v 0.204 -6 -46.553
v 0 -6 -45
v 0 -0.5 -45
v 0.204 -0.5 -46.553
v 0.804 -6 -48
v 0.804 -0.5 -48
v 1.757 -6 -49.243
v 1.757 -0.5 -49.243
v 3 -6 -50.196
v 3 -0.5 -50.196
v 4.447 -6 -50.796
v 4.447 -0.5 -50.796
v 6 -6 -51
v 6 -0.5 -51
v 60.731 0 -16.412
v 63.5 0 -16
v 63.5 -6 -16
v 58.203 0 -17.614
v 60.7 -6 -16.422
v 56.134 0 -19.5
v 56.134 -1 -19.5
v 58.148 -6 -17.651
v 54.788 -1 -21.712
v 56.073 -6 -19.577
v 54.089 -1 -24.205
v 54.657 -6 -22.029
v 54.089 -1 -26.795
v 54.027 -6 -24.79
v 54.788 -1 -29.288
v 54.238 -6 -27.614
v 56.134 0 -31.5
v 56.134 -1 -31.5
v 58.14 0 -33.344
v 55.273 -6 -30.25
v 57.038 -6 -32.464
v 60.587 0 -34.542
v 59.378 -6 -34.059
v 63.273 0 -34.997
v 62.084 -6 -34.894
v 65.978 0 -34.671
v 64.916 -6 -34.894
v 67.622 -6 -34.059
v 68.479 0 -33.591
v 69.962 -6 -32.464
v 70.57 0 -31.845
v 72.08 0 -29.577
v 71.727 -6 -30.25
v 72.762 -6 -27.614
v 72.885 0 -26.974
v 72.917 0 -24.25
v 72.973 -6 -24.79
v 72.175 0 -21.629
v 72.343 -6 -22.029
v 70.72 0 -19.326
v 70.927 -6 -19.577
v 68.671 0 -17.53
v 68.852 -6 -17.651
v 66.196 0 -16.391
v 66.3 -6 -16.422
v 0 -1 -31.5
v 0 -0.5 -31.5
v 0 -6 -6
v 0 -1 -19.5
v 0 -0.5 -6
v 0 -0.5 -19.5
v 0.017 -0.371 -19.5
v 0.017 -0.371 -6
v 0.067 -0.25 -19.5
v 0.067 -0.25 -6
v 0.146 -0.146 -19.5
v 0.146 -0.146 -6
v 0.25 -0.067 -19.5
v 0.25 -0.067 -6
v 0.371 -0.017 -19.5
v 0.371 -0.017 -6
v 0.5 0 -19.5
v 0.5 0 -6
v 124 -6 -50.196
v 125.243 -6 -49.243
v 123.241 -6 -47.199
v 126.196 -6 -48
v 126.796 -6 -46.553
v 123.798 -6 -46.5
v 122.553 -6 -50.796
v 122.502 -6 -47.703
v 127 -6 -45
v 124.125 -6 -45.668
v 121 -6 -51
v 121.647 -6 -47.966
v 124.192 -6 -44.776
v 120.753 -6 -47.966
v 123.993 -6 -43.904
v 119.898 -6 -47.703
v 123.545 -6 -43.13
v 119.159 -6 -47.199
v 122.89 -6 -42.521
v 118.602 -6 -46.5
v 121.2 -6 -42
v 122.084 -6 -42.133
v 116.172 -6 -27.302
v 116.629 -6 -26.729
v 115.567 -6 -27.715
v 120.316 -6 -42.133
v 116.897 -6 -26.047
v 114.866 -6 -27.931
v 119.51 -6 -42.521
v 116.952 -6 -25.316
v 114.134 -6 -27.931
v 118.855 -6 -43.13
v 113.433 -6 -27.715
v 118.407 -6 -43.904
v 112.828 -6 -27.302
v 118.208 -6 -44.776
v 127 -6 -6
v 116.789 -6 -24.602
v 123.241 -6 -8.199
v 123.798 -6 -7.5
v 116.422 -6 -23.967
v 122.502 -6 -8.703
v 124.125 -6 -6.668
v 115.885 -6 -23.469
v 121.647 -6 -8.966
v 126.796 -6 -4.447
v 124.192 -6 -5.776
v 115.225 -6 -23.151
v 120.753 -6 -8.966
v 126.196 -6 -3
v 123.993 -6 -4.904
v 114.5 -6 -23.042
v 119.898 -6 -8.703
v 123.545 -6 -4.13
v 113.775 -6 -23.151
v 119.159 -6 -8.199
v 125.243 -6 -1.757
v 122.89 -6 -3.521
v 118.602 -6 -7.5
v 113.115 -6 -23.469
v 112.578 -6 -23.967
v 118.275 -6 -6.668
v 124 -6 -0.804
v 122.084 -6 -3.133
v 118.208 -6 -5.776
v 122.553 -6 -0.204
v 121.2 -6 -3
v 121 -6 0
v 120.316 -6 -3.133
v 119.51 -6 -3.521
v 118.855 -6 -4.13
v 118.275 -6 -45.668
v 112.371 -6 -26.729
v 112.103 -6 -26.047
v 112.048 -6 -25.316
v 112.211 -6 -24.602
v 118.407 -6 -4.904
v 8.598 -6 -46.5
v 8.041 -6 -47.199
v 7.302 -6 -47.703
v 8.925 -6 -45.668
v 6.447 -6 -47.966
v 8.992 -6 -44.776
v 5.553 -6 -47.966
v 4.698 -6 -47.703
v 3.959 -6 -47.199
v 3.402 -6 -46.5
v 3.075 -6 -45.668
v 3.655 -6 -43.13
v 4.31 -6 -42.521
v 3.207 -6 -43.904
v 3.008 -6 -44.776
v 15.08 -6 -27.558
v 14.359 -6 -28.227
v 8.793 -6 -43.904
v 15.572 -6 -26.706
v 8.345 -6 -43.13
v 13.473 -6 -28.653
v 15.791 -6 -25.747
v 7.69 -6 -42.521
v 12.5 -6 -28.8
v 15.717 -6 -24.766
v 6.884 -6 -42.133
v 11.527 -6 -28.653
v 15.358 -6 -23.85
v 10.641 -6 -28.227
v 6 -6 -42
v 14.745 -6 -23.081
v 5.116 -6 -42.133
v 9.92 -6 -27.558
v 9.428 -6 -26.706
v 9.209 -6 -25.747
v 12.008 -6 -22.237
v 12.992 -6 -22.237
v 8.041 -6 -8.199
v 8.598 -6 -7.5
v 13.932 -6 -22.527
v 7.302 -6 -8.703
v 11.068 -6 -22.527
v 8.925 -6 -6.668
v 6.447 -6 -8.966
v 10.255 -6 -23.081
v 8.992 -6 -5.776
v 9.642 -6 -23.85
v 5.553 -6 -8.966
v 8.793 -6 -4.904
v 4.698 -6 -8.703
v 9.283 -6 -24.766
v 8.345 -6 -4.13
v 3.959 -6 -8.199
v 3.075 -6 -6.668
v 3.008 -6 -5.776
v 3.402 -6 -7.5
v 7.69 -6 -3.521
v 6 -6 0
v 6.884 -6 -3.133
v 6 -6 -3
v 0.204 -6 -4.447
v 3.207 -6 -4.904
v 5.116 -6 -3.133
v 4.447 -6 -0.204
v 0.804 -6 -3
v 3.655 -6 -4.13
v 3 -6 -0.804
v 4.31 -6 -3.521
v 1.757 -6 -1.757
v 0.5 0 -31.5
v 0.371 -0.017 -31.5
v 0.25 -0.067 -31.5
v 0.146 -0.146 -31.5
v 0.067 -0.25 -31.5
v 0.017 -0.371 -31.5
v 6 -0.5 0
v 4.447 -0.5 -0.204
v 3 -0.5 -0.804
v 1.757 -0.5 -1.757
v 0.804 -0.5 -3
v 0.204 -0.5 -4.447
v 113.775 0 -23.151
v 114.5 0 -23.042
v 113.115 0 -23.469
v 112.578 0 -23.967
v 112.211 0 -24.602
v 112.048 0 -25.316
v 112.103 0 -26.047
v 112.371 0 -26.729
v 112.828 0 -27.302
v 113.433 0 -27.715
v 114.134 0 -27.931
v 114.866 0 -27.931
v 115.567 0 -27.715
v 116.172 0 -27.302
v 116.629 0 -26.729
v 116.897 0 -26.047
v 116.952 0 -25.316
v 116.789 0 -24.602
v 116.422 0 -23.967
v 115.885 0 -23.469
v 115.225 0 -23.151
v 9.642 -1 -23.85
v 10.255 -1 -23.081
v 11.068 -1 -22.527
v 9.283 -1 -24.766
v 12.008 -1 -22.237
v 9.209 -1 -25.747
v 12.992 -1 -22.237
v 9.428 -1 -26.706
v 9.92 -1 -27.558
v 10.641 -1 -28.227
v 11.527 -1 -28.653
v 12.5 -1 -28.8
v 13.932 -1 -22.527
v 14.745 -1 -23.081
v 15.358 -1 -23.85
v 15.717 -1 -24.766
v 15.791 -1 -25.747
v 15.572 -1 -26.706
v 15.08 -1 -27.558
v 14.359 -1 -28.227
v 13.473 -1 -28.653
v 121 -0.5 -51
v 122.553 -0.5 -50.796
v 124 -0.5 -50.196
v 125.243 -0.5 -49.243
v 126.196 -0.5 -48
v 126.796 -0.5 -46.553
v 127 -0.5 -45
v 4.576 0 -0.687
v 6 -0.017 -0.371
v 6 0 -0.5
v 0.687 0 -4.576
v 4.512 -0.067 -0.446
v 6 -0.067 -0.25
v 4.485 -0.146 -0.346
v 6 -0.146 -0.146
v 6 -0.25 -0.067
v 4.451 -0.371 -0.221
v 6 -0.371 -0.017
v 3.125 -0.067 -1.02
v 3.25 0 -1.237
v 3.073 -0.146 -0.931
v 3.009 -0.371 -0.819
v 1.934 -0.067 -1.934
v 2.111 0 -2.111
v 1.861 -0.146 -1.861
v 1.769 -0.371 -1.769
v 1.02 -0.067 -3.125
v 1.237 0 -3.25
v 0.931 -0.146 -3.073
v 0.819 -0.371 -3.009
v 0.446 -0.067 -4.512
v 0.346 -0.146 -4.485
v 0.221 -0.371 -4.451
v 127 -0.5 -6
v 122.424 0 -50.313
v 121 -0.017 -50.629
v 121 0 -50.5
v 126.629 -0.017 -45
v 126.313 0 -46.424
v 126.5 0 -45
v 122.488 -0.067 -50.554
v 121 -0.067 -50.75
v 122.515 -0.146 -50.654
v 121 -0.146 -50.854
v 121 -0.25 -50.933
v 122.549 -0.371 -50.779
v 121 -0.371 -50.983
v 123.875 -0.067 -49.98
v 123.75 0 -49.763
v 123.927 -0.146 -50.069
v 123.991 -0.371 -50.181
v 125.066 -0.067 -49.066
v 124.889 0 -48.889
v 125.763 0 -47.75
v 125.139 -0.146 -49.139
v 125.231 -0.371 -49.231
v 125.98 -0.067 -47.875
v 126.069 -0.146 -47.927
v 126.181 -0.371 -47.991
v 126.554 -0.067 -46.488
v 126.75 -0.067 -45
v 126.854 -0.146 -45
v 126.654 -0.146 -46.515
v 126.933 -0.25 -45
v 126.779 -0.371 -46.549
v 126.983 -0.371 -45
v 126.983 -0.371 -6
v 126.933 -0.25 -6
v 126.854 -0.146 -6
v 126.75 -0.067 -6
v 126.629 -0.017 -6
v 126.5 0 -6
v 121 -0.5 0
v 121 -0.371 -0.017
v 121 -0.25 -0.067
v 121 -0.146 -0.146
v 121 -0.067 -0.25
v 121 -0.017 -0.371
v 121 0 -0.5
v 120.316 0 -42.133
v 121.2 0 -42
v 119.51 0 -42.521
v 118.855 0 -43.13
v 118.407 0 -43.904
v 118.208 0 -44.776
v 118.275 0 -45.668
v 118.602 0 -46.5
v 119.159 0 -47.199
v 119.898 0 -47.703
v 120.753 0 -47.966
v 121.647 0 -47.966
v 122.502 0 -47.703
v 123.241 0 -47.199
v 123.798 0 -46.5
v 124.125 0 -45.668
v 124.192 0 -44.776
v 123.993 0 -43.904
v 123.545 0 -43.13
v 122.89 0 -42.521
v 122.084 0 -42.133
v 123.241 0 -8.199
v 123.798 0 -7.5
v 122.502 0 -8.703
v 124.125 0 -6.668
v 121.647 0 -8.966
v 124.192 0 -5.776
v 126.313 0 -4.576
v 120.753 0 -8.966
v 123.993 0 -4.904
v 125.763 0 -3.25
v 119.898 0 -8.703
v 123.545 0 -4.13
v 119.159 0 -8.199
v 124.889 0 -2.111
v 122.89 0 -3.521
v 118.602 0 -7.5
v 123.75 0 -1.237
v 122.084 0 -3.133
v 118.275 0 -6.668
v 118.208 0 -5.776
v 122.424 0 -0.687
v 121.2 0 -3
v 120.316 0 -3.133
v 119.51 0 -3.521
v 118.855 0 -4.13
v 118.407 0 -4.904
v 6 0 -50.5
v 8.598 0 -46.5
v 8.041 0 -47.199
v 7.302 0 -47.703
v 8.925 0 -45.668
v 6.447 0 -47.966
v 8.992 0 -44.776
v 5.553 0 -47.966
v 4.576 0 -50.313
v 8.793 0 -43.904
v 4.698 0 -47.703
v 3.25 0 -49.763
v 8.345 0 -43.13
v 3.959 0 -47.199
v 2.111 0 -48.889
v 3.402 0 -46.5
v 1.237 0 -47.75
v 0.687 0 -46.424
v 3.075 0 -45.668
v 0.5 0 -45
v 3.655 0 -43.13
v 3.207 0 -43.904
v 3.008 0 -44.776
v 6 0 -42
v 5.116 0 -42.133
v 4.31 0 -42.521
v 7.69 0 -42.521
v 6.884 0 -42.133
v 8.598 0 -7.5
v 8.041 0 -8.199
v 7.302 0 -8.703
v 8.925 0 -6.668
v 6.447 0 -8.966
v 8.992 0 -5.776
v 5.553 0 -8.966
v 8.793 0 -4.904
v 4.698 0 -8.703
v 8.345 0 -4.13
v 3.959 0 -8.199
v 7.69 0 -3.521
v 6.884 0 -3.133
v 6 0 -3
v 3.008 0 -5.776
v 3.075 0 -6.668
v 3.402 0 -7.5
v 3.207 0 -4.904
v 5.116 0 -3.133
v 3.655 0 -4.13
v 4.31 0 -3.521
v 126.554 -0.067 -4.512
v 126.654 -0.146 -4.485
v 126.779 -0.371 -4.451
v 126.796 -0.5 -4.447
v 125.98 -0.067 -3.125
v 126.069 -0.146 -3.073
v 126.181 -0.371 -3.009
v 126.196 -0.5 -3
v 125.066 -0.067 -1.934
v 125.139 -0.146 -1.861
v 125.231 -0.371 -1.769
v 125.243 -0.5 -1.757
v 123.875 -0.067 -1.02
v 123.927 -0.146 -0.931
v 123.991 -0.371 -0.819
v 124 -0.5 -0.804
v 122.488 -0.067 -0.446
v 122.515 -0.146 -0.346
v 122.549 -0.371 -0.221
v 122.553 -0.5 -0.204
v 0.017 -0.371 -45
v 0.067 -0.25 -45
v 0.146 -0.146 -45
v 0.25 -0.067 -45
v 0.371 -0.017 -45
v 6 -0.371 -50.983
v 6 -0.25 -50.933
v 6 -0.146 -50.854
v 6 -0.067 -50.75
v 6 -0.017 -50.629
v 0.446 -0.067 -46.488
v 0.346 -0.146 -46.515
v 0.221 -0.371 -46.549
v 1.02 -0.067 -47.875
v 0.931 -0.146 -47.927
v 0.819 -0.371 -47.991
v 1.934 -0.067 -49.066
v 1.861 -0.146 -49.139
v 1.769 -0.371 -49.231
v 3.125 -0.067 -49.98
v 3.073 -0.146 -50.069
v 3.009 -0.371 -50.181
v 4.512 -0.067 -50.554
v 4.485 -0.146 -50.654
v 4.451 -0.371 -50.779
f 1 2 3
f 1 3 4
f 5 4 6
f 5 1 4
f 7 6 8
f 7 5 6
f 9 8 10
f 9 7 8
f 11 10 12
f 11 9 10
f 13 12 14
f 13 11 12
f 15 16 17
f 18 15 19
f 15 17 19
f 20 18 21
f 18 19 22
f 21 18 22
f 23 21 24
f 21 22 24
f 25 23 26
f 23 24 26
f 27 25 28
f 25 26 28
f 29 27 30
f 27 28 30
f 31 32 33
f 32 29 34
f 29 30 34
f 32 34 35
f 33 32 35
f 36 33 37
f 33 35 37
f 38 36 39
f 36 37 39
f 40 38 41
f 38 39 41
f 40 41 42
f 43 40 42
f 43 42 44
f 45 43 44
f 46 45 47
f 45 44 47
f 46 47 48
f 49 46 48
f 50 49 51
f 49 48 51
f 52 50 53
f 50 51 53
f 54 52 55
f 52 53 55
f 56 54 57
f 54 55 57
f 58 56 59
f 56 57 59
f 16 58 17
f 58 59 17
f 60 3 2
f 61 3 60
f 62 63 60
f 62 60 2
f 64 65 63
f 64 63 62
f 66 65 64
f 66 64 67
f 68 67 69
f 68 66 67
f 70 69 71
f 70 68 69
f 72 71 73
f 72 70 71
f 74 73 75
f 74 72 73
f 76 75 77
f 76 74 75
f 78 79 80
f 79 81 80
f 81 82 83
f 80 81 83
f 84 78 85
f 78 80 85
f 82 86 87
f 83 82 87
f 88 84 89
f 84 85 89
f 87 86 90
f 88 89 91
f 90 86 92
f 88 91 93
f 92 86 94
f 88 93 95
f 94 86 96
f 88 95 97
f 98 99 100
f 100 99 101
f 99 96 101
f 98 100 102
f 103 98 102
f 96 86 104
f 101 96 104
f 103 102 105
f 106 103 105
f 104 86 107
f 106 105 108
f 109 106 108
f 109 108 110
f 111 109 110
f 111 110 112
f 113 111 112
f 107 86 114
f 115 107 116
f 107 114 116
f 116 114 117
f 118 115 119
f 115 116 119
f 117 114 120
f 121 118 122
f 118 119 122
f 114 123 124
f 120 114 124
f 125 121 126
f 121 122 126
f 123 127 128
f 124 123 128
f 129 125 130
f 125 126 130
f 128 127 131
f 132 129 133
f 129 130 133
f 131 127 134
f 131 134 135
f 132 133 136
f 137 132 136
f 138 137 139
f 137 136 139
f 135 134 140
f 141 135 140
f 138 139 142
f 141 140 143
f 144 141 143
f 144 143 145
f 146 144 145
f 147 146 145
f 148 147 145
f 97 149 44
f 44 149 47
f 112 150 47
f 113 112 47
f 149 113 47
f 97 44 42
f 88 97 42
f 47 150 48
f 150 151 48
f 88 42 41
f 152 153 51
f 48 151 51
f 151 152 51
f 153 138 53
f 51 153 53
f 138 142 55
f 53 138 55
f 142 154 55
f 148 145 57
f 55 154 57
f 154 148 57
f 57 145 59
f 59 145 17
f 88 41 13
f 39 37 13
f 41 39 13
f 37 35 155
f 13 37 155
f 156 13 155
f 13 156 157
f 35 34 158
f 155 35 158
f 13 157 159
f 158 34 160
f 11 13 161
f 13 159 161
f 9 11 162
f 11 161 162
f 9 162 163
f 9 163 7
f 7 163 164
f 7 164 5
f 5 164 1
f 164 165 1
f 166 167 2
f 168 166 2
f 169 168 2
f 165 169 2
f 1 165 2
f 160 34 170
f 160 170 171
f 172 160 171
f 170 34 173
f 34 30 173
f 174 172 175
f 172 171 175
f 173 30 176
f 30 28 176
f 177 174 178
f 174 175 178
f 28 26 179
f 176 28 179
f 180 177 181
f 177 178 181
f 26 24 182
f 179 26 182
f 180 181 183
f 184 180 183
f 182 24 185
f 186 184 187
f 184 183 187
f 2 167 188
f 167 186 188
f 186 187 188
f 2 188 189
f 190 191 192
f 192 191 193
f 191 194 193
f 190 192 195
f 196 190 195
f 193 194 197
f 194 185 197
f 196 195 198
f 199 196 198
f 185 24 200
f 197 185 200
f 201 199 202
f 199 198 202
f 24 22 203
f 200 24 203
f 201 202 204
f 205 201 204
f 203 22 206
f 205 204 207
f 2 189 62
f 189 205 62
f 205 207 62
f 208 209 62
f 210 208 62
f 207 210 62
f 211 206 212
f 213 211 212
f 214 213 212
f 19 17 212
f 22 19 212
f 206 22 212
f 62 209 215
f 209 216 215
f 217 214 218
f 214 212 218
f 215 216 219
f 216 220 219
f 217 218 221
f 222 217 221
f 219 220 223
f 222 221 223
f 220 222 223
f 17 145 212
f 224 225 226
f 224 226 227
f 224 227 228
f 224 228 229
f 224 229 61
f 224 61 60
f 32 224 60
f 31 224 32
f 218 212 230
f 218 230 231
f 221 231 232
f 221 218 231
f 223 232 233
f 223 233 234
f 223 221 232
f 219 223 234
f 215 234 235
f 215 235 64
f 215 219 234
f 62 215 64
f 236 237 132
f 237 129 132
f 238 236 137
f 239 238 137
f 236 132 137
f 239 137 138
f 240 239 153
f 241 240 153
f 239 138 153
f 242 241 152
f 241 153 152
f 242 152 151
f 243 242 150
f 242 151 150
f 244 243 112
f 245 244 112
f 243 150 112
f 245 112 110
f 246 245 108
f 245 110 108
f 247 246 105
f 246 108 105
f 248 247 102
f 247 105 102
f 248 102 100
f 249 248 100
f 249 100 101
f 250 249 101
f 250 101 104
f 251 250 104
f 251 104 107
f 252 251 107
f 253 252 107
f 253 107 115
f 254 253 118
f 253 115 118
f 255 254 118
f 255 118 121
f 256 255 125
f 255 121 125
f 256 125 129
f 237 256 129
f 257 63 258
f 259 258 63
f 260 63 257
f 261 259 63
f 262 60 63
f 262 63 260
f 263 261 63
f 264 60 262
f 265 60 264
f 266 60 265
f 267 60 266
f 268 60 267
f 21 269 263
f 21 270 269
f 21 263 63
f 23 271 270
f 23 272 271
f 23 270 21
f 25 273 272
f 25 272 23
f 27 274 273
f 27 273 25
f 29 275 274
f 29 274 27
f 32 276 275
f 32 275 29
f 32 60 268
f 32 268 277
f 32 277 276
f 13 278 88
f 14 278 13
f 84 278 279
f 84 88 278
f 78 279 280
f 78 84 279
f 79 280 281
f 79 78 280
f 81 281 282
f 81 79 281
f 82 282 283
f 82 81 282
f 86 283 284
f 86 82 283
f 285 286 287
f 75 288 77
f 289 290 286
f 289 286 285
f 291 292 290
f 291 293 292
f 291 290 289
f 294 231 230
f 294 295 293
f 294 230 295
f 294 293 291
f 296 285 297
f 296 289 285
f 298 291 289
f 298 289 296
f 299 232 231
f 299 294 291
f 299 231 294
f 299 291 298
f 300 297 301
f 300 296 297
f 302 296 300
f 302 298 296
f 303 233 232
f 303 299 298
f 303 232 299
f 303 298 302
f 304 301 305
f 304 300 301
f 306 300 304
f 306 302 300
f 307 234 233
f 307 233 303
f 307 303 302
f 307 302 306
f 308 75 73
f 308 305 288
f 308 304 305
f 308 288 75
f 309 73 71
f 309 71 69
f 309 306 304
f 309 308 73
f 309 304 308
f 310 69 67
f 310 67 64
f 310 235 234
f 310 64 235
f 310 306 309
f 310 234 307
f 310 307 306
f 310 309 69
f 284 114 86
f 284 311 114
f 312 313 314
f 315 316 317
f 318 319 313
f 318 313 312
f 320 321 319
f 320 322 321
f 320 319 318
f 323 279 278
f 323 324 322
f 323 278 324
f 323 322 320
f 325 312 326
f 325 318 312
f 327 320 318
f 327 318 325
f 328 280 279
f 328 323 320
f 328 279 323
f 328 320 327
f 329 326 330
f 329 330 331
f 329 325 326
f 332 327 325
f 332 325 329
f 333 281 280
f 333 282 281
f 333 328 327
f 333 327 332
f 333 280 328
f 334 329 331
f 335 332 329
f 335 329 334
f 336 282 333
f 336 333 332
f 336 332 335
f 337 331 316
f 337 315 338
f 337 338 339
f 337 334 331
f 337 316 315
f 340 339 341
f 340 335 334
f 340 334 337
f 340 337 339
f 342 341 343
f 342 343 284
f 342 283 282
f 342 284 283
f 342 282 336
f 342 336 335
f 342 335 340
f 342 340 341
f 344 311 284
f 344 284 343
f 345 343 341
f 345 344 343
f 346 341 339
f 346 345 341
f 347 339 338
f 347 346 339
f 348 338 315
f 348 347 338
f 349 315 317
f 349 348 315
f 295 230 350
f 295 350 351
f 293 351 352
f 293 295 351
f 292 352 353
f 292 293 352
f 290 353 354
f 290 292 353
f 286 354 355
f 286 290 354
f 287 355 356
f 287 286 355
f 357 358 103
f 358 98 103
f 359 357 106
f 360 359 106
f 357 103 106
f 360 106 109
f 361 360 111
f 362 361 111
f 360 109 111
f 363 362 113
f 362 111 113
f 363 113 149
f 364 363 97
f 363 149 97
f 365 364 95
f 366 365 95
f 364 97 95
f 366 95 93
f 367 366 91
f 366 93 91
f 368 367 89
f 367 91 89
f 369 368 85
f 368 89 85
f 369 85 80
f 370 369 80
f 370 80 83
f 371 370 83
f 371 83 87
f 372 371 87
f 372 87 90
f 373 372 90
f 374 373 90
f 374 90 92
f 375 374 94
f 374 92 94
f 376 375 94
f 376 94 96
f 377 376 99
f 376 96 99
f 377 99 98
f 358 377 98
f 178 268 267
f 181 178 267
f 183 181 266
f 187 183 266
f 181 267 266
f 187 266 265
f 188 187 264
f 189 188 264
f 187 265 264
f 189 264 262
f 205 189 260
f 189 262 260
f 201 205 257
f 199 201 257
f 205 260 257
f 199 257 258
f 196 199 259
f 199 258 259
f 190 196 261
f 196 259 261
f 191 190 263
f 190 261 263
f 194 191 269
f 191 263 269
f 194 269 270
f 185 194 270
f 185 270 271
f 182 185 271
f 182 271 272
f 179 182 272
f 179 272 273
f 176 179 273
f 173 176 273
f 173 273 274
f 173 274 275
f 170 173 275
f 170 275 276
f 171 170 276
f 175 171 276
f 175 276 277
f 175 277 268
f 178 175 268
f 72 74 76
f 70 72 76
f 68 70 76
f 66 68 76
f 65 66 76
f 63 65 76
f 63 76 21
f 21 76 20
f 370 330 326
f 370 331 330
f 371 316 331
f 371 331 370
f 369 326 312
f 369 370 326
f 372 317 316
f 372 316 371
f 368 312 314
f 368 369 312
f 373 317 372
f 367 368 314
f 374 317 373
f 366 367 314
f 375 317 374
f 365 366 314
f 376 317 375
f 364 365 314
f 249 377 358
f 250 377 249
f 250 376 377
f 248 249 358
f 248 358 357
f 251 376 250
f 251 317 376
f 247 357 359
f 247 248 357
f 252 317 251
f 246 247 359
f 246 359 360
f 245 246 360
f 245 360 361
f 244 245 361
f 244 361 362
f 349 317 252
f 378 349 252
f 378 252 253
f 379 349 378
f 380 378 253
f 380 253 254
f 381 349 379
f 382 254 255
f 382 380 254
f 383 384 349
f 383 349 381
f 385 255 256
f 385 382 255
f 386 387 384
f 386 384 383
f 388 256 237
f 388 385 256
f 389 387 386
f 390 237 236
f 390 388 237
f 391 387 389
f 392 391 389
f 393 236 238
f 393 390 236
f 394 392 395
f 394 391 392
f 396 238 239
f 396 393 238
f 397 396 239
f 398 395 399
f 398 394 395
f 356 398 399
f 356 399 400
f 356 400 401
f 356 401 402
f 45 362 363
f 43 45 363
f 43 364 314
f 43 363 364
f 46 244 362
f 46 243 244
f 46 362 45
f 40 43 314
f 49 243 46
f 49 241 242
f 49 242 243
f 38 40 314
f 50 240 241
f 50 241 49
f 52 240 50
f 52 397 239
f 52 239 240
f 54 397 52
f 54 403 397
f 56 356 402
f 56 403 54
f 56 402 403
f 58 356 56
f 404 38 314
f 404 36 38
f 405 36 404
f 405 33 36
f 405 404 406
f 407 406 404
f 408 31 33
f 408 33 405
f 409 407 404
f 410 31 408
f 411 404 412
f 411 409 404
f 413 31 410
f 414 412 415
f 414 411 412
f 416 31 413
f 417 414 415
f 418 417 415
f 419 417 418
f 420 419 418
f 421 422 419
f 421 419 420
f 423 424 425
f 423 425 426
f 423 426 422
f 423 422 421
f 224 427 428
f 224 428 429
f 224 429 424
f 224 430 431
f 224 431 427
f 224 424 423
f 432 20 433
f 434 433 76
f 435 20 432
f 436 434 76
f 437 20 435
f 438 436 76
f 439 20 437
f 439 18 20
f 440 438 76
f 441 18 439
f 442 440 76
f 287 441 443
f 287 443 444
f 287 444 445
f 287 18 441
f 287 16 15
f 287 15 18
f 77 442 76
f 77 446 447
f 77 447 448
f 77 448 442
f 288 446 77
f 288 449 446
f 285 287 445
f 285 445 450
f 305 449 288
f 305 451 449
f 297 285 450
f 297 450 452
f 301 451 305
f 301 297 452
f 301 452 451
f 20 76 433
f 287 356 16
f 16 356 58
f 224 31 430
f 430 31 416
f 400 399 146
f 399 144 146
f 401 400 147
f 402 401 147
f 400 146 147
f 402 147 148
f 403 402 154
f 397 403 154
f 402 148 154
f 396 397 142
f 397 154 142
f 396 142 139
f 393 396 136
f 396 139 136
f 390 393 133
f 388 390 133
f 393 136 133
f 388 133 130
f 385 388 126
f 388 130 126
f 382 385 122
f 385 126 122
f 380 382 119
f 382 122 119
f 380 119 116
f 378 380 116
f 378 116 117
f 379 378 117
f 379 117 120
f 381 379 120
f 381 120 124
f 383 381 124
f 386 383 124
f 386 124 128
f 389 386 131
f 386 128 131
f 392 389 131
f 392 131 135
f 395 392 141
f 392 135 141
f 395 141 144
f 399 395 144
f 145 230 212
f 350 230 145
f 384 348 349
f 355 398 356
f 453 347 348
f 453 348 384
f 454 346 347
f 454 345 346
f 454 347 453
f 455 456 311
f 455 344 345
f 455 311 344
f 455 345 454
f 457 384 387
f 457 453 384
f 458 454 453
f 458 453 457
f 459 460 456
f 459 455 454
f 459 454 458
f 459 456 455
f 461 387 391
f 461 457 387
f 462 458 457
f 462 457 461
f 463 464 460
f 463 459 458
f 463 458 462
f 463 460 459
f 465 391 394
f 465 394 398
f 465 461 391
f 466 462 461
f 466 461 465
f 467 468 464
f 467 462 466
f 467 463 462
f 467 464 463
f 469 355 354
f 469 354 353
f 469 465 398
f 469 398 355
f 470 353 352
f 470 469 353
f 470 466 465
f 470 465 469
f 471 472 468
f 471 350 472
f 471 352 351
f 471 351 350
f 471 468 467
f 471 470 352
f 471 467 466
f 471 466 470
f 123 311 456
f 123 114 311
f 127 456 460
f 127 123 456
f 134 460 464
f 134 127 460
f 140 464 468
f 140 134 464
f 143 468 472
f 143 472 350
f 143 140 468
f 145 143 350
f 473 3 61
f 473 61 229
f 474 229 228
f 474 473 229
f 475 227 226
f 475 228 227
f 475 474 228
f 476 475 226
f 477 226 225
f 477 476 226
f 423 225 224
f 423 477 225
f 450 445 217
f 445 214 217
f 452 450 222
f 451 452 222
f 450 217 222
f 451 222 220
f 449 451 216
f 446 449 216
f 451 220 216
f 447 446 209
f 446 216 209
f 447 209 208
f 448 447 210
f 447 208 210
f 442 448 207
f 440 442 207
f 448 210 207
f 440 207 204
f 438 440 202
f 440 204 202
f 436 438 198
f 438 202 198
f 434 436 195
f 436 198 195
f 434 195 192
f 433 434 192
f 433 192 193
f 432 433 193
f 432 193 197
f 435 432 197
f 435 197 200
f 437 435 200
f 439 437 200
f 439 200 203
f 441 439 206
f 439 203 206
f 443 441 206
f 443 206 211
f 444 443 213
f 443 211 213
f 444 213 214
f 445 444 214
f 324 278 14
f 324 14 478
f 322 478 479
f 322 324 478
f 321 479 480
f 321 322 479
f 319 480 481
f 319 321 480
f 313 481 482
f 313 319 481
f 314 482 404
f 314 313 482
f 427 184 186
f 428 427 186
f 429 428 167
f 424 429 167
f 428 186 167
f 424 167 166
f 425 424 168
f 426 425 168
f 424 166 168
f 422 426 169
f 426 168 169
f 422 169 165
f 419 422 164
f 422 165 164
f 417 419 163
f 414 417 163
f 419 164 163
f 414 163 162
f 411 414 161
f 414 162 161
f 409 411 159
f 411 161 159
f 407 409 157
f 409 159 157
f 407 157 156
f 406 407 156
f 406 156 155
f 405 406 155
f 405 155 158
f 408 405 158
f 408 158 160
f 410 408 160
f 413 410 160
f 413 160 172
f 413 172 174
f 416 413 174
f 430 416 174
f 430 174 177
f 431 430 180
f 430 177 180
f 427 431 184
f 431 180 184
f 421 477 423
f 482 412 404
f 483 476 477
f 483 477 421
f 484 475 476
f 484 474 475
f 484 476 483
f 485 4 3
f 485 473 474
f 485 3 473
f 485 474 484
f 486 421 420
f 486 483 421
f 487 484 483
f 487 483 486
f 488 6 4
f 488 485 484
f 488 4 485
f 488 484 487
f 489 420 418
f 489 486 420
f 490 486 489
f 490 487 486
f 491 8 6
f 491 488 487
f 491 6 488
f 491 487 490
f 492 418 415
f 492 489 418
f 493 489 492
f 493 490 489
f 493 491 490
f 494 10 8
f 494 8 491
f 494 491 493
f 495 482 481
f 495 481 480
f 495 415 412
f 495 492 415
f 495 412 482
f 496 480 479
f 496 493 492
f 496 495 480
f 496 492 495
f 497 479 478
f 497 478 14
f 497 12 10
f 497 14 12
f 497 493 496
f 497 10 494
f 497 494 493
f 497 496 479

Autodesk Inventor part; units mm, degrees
ref_plane "YZ Plane" through (0, 0, 0) normal (1, 0, 0) x (0, 1, 0)
ref_plane "XZ Plane" through (0, 0, 0) normal (0, 1, 0) x (-1, 0, 0)
ref_plane "XY Plane" through (0, 0, 0) normal (0, 0, 1) x (1, 0, 0)
sketch "Esboço1" plane through (0, 0, 0) normal (0, 1, 0) x (-1, 0, 0)
  line L0 (0, 0) -> (-127, 0)
  line L1 (-127, 0) -> (-127, -51)
  line L2 (-127, -51) -> (0, -51)
  line L3 (0, -51) -> (0, 0)
  dimension "d0" = 127
  dimension "d1" = 51
extrude "Extrusão1" add sketch "Esboço1" against normal blind 6
sketch "Esboço2" plane through (0, 0, 0) normal (0, 1, 0) x (1, 0, 0)
  line L0 (127, 51) -> (127, 0) projected
  line L1 (63.5, 0) -> (6, 0)
  line L2 (0, 51) -> (127, 51) projected
  line L3 (0, 6) -> (6, 6)
  point P0 (6, 45)
  point P1 (121.2, 45)
  point P2 (121.2, 6)
  dimension "d4" = 57.5
hole "Furo1" at (6, 0, -6) at (6, 0, -45) at (121.2, 0, -45) at (121.2, 0, -6) direction (0, -1, 0) diameter 6 end through all
sketch "Esboço3" plane through (0, 0, 0) normal (0, 1, 0) x (1, 0, 0)
  line L0 (127, 0) -> (0, 0) projected
  line L1 (0, 0) -> (57.5, 0)
  line L2 (0, 51) -> (127, 51) projected
  line L3 (0, 0) -> (0, 51) projected
  line L4 (0, 25.5) -> (127, 25.5)
  line L5 (127, 51) -> (127, 0) projected
  line L6 (0, 25.5) -> (63.5, 25.5)
  circle A0 centre (63.5, 25.5) radius 9.5
  point P0 (57.5, 25.5)
  dimension "d17" = 57.5
  dimension "d47" = 63.5
  dimension "d48" = 19
hole "Furo2" at (63.5, 0, -25.5) direction (0, -1, 0) diameter 19 end through all
sketch "Esboço4" plane through (0, 0, 0) normal (0, 1, 0) x (1, 0, 0)
  line L0 (0, 0) -> (0, 51) projected
  line L1 (0, 31.5) -> (56.1345, 31.5)
  line L2 (0, 19.5) -> (56.1345, 19.5)
  circle A0 centre (63.5, 25.5) radius 9.5 projected
  circle A1 centre (63.5, 25.5) radius 9.5
extrude "Extrusão2" cut sketch "Esboço4" against normal blind 1 contours L0 L1 A0 L2
sketch "Esboço5" plane through (0, -1, 0) normal (0, 1, 0) x (1, 0, 0)
  circle A0 centre (63.5, 25.5) radius 9.5 projected
  circle A1 centre (63.5, 25.5) radius 9.5
  line L0 (63.5, 25.5) -> (12.5, 25.5)
  point P0 (0, 0)
  dimension "d49" = 51
hole "Furo3" at (12.5, -1, -25.5) direction (0, -1, 0) diameter 4.917 end through all thread size "M6x1" class "6H" standard "ANSI Metric M Profile"
fillet "Arredondamento1" radius 6 4 edges at (127, -3, -51) (127, -3, 0) (0, -3, 0) (0, -3, -51)
fillet "Arredondamento2" radius 0.5 9 edges at (1.7574, 0, -49.2426) (0, 0, -38.25) (125.2426, 0, -49.2426) (127, 0, -25.5) (125.2426, 0, -1.7574) (63.5, 0, 0) (1.7574, 0, -1.7574) (0, 0, -12.75) (63.5, 0, -51)
sketch "Esboço6" plane through (0, 0, 0) normal (0, 1, 0) x (1, 0, 0)
  circle A0 centre (12.5, 25.5) radius 2.4585 projected
  circle A1 centre (12.5, 25.5) radius 2.4585
  line L0 (12.5, 25.5) -> (114.5, 25.5)
  point P0 (0, 0)
  dimension "d50" = 102
hole "Furo4" at (114.5, 0, -25.5) direction (0, -1, 0) diameter 4.917 end through all thread size "M6x1" class "6H" standard "ANSI Metric M Profile"
sketch "Sketch7" plane through (0, -6, 0) normal (0, -1, 0) x (1, 0, 0)
  point P0 (12.5, -25.5)
hole "Hole5" at (12.5, -6, -25.5) direction (0, 1, 0) diameter 6.6 end through all
properties part number "base_plate" material "Aluminum 6061-AHC"
